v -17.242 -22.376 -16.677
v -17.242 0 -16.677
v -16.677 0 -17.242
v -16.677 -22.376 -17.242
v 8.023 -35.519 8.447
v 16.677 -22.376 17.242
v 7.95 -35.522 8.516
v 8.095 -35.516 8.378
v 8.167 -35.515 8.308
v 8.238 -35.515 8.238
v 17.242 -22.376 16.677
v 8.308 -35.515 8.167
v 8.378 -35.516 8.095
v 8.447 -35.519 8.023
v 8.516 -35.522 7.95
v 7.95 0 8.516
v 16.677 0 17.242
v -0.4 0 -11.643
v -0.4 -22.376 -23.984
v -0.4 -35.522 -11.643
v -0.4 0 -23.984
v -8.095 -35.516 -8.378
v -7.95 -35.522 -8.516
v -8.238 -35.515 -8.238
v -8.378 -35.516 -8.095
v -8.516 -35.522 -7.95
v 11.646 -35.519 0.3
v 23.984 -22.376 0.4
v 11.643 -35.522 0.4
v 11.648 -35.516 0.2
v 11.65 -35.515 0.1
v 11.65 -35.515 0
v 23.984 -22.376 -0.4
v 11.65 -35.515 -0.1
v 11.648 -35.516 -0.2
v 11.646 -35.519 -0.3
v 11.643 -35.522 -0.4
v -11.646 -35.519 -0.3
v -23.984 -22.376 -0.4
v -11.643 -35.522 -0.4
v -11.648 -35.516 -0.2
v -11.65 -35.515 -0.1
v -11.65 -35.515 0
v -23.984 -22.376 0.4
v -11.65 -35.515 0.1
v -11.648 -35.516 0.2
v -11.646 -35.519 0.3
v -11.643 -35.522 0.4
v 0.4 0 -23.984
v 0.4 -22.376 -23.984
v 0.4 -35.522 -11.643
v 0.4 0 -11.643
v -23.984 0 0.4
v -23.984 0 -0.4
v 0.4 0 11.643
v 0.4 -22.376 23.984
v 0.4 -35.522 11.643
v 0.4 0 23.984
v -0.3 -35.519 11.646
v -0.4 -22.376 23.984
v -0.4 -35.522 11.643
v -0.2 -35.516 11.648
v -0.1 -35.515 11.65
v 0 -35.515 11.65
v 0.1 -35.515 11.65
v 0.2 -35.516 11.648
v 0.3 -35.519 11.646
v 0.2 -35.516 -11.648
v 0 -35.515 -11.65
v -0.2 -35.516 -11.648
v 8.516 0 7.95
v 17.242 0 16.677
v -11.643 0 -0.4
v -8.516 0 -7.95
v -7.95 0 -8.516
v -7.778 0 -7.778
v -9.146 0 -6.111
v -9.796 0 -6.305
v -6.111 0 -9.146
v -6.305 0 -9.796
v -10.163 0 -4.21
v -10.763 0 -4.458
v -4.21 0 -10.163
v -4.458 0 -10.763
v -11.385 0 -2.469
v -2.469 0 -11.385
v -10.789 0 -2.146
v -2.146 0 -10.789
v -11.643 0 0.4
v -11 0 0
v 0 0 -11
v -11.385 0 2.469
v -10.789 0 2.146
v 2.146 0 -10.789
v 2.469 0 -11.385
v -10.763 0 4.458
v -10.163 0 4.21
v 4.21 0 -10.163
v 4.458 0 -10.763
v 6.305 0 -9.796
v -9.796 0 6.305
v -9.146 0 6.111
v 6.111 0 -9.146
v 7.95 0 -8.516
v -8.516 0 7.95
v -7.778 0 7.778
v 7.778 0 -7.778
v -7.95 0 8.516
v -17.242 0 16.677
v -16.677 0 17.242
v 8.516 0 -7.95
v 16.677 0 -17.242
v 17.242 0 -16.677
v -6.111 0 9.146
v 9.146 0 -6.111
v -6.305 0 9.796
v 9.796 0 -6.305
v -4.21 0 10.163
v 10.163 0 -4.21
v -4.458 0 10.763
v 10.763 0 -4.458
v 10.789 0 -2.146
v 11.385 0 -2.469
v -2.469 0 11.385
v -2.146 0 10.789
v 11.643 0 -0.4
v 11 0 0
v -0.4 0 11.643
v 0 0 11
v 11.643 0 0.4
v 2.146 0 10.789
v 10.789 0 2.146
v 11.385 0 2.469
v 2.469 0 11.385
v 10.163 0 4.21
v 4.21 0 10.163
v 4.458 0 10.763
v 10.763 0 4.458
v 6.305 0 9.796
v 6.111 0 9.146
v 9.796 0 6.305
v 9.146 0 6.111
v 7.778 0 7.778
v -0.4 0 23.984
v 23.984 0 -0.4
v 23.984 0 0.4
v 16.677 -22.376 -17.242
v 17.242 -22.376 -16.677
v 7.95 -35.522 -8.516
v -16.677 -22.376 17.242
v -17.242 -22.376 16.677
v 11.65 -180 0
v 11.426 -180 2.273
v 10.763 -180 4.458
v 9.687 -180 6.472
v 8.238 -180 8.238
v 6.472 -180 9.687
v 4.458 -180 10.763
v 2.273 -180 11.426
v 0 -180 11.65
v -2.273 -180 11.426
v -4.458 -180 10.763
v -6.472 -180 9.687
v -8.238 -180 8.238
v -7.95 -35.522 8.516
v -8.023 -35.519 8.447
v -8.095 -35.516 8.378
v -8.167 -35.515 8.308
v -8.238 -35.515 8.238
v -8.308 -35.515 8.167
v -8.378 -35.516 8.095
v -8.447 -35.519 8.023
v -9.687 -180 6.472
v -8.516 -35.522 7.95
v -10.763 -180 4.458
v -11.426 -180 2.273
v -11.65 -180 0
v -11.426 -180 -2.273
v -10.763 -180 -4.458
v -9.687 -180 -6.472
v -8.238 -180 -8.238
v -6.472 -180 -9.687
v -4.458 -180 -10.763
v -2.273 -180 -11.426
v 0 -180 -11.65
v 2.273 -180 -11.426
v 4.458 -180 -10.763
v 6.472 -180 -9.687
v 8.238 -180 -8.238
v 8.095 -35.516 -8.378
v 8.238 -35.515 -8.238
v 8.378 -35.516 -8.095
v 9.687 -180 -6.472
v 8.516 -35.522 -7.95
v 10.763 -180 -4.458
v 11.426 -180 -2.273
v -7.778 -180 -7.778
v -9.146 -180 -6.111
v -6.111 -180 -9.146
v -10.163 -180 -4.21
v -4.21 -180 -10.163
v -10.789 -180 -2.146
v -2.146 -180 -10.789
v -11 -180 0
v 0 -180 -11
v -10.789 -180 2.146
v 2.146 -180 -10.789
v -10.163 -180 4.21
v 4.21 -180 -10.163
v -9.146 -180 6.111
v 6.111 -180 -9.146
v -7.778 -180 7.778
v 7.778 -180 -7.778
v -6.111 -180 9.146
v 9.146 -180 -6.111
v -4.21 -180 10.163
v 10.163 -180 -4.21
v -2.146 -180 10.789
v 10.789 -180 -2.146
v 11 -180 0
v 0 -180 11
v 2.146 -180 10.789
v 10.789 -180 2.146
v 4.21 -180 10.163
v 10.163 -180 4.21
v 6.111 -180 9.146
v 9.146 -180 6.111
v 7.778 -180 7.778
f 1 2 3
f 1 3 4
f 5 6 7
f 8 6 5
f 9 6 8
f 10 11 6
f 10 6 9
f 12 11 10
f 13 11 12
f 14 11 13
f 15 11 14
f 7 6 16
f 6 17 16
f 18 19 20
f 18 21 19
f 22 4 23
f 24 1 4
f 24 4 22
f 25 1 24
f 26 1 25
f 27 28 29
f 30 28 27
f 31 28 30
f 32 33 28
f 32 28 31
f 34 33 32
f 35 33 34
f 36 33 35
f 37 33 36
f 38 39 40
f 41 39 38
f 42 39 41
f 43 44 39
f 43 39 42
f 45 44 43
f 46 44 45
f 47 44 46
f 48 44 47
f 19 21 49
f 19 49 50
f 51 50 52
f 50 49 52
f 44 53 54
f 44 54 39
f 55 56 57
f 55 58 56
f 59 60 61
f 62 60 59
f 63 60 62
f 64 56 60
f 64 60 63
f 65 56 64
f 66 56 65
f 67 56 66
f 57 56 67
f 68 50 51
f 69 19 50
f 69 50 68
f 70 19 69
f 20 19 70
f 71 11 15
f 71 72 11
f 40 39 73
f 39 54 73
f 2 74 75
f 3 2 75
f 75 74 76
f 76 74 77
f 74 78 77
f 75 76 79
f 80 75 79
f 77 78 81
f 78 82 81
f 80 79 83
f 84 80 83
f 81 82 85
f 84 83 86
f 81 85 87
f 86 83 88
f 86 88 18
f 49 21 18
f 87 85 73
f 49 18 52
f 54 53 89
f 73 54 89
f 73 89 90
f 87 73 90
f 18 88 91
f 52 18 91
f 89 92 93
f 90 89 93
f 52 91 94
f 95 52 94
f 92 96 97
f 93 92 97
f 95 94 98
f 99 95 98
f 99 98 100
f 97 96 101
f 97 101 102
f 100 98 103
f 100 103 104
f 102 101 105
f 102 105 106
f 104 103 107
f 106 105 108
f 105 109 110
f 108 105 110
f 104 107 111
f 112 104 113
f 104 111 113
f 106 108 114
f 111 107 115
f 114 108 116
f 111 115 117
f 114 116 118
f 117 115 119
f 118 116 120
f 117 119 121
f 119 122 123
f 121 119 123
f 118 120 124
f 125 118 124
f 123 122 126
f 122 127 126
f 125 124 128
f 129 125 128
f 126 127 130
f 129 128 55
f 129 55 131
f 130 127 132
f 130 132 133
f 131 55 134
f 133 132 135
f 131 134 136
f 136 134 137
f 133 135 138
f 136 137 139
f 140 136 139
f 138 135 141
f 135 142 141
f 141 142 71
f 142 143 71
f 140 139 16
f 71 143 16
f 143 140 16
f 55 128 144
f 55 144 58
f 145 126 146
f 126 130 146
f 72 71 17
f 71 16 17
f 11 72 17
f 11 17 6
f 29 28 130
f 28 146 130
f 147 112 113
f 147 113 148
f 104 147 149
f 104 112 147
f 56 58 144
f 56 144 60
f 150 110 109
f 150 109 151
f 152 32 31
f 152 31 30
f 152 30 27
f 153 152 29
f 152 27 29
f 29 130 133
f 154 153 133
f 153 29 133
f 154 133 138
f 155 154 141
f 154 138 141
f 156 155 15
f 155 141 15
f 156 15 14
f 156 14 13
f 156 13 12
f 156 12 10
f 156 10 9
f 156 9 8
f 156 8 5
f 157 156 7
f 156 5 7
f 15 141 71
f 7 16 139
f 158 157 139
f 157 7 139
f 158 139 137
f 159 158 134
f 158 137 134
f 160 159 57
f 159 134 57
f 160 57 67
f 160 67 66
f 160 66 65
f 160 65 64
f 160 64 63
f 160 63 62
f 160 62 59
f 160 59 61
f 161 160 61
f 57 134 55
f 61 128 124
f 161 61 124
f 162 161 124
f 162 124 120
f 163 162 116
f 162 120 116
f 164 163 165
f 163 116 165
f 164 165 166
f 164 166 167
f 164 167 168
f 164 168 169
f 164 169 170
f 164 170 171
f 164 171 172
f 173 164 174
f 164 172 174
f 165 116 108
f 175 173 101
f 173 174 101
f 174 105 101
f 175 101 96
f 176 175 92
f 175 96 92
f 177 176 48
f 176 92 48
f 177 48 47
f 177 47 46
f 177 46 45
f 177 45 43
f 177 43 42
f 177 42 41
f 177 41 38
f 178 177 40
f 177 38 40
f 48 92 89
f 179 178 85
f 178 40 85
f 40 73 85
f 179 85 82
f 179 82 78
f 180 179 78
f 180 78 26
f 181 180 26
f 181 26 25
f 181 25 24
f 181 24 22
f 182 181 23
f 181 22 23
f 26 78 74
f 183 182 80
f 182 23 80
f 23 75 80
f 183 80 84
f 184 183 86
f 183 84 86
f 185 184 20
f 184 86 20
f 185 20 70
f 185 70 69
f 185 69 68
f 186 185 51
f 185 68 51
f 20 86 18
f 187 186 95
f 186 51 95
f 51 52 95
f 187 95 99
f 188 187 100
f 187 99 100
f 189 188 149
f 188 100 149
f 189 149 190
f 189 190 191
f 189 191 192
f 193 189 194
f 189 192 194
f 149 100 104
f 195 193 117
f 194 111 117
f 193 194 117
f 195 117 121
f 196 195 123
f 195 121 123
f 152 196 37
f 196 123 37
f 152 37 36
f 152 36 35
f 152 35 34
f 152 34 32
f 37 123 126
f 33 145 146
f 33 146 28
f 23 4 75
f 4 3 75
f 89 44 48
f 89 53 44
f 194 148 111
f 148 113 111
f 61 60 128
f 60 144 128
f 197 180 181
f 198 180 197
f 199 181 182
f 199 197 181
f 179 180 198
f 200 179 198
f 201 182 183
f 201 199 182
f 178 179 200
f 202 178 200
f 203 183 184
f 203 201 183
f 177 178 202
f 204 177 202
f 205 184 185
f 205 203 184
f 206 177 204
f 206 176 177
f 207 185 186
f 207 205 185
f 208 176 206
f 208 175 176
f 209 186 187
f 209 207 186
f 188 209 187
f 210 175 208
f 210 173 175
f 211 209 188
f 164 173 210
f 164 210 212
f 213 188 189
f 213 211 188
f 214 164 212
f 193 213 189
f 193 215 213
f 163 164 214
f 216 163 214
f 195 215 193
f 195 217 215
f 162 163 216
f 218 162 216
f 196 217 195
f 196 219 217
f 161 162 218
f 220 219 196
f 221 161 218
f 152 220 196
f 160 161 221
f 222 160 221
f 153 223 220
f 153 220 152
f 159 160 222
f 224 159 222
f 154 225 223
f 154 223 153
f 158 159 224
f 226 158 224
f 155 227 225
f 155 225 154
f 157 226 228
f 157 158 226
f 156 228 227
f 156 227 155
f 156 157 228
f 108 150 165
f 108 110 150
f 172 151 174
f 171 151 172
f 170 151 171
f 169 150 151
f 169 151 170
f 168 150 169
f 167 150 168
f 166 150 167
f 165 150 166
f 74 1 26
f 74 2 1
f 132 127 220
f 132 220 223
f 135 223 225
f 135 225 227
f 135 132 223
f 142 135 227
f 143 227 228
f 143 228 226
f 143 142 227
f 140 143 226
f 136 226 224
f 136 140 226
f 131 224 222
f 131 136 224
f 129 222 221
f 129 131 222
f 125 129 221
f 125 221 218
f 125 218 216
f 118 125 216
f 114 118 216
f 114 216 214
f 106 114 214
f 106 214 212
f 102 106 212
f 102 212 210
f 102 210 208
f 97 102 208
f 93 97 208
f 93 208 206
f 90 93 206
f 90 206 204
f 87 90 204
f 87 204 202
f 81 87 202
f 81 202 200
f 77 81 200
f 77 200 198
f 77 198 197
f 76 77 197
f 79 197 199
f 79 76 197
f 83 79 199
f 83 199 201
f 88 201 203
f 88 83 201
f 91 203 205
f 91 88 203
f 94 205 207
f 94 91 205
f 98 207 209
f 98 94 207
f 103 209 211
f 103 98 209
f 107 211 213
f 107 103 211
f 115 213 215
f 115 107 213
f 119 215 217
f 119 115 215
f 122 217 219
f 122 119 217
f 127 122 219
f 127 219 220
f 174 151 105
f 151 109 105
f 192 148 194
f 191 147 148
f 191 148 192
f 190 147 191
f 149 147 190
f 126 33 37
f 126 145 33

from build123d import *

# Parameters (mm, degrees)
F0_R     = 11.65
F0_R_2   = 11
F1_DEPTH = 180
F3_DEPTH = 0.4
F4_COUNT = 8


with BuildPart() as f1:
    # F0 (on Front) → F1 (new body)
    with BuildSketch(Plane.XZ):
        Circle(F0_R)
        Circle(F0_R_2, mode=Mode.SUBTRACT)
    extrude(amount=F1_DEPTH)

    # F2 (on Top) → F3 (join, symmetric)
    with BuildSketch(Plane.XY):
        Polygon((-11.318761, -35.867412), (-11.318761, 0), (-23.984207, 0), (-23.984207, -22.375958), align=None)
    extrude(amount=F3_DEPTH, both=True)

    # F4: F1 ×8 about axis
    f4_axis = Axis((0, 0, 0), (0, 1, 0))


with BuildPart() as f1_1:
    add(f1.part)
    for i in range(1, F4_COUNT):
        add(f1.part.rotate(f4_axis, i * 360 / F4_COUNT))


solid = f1_1.part
